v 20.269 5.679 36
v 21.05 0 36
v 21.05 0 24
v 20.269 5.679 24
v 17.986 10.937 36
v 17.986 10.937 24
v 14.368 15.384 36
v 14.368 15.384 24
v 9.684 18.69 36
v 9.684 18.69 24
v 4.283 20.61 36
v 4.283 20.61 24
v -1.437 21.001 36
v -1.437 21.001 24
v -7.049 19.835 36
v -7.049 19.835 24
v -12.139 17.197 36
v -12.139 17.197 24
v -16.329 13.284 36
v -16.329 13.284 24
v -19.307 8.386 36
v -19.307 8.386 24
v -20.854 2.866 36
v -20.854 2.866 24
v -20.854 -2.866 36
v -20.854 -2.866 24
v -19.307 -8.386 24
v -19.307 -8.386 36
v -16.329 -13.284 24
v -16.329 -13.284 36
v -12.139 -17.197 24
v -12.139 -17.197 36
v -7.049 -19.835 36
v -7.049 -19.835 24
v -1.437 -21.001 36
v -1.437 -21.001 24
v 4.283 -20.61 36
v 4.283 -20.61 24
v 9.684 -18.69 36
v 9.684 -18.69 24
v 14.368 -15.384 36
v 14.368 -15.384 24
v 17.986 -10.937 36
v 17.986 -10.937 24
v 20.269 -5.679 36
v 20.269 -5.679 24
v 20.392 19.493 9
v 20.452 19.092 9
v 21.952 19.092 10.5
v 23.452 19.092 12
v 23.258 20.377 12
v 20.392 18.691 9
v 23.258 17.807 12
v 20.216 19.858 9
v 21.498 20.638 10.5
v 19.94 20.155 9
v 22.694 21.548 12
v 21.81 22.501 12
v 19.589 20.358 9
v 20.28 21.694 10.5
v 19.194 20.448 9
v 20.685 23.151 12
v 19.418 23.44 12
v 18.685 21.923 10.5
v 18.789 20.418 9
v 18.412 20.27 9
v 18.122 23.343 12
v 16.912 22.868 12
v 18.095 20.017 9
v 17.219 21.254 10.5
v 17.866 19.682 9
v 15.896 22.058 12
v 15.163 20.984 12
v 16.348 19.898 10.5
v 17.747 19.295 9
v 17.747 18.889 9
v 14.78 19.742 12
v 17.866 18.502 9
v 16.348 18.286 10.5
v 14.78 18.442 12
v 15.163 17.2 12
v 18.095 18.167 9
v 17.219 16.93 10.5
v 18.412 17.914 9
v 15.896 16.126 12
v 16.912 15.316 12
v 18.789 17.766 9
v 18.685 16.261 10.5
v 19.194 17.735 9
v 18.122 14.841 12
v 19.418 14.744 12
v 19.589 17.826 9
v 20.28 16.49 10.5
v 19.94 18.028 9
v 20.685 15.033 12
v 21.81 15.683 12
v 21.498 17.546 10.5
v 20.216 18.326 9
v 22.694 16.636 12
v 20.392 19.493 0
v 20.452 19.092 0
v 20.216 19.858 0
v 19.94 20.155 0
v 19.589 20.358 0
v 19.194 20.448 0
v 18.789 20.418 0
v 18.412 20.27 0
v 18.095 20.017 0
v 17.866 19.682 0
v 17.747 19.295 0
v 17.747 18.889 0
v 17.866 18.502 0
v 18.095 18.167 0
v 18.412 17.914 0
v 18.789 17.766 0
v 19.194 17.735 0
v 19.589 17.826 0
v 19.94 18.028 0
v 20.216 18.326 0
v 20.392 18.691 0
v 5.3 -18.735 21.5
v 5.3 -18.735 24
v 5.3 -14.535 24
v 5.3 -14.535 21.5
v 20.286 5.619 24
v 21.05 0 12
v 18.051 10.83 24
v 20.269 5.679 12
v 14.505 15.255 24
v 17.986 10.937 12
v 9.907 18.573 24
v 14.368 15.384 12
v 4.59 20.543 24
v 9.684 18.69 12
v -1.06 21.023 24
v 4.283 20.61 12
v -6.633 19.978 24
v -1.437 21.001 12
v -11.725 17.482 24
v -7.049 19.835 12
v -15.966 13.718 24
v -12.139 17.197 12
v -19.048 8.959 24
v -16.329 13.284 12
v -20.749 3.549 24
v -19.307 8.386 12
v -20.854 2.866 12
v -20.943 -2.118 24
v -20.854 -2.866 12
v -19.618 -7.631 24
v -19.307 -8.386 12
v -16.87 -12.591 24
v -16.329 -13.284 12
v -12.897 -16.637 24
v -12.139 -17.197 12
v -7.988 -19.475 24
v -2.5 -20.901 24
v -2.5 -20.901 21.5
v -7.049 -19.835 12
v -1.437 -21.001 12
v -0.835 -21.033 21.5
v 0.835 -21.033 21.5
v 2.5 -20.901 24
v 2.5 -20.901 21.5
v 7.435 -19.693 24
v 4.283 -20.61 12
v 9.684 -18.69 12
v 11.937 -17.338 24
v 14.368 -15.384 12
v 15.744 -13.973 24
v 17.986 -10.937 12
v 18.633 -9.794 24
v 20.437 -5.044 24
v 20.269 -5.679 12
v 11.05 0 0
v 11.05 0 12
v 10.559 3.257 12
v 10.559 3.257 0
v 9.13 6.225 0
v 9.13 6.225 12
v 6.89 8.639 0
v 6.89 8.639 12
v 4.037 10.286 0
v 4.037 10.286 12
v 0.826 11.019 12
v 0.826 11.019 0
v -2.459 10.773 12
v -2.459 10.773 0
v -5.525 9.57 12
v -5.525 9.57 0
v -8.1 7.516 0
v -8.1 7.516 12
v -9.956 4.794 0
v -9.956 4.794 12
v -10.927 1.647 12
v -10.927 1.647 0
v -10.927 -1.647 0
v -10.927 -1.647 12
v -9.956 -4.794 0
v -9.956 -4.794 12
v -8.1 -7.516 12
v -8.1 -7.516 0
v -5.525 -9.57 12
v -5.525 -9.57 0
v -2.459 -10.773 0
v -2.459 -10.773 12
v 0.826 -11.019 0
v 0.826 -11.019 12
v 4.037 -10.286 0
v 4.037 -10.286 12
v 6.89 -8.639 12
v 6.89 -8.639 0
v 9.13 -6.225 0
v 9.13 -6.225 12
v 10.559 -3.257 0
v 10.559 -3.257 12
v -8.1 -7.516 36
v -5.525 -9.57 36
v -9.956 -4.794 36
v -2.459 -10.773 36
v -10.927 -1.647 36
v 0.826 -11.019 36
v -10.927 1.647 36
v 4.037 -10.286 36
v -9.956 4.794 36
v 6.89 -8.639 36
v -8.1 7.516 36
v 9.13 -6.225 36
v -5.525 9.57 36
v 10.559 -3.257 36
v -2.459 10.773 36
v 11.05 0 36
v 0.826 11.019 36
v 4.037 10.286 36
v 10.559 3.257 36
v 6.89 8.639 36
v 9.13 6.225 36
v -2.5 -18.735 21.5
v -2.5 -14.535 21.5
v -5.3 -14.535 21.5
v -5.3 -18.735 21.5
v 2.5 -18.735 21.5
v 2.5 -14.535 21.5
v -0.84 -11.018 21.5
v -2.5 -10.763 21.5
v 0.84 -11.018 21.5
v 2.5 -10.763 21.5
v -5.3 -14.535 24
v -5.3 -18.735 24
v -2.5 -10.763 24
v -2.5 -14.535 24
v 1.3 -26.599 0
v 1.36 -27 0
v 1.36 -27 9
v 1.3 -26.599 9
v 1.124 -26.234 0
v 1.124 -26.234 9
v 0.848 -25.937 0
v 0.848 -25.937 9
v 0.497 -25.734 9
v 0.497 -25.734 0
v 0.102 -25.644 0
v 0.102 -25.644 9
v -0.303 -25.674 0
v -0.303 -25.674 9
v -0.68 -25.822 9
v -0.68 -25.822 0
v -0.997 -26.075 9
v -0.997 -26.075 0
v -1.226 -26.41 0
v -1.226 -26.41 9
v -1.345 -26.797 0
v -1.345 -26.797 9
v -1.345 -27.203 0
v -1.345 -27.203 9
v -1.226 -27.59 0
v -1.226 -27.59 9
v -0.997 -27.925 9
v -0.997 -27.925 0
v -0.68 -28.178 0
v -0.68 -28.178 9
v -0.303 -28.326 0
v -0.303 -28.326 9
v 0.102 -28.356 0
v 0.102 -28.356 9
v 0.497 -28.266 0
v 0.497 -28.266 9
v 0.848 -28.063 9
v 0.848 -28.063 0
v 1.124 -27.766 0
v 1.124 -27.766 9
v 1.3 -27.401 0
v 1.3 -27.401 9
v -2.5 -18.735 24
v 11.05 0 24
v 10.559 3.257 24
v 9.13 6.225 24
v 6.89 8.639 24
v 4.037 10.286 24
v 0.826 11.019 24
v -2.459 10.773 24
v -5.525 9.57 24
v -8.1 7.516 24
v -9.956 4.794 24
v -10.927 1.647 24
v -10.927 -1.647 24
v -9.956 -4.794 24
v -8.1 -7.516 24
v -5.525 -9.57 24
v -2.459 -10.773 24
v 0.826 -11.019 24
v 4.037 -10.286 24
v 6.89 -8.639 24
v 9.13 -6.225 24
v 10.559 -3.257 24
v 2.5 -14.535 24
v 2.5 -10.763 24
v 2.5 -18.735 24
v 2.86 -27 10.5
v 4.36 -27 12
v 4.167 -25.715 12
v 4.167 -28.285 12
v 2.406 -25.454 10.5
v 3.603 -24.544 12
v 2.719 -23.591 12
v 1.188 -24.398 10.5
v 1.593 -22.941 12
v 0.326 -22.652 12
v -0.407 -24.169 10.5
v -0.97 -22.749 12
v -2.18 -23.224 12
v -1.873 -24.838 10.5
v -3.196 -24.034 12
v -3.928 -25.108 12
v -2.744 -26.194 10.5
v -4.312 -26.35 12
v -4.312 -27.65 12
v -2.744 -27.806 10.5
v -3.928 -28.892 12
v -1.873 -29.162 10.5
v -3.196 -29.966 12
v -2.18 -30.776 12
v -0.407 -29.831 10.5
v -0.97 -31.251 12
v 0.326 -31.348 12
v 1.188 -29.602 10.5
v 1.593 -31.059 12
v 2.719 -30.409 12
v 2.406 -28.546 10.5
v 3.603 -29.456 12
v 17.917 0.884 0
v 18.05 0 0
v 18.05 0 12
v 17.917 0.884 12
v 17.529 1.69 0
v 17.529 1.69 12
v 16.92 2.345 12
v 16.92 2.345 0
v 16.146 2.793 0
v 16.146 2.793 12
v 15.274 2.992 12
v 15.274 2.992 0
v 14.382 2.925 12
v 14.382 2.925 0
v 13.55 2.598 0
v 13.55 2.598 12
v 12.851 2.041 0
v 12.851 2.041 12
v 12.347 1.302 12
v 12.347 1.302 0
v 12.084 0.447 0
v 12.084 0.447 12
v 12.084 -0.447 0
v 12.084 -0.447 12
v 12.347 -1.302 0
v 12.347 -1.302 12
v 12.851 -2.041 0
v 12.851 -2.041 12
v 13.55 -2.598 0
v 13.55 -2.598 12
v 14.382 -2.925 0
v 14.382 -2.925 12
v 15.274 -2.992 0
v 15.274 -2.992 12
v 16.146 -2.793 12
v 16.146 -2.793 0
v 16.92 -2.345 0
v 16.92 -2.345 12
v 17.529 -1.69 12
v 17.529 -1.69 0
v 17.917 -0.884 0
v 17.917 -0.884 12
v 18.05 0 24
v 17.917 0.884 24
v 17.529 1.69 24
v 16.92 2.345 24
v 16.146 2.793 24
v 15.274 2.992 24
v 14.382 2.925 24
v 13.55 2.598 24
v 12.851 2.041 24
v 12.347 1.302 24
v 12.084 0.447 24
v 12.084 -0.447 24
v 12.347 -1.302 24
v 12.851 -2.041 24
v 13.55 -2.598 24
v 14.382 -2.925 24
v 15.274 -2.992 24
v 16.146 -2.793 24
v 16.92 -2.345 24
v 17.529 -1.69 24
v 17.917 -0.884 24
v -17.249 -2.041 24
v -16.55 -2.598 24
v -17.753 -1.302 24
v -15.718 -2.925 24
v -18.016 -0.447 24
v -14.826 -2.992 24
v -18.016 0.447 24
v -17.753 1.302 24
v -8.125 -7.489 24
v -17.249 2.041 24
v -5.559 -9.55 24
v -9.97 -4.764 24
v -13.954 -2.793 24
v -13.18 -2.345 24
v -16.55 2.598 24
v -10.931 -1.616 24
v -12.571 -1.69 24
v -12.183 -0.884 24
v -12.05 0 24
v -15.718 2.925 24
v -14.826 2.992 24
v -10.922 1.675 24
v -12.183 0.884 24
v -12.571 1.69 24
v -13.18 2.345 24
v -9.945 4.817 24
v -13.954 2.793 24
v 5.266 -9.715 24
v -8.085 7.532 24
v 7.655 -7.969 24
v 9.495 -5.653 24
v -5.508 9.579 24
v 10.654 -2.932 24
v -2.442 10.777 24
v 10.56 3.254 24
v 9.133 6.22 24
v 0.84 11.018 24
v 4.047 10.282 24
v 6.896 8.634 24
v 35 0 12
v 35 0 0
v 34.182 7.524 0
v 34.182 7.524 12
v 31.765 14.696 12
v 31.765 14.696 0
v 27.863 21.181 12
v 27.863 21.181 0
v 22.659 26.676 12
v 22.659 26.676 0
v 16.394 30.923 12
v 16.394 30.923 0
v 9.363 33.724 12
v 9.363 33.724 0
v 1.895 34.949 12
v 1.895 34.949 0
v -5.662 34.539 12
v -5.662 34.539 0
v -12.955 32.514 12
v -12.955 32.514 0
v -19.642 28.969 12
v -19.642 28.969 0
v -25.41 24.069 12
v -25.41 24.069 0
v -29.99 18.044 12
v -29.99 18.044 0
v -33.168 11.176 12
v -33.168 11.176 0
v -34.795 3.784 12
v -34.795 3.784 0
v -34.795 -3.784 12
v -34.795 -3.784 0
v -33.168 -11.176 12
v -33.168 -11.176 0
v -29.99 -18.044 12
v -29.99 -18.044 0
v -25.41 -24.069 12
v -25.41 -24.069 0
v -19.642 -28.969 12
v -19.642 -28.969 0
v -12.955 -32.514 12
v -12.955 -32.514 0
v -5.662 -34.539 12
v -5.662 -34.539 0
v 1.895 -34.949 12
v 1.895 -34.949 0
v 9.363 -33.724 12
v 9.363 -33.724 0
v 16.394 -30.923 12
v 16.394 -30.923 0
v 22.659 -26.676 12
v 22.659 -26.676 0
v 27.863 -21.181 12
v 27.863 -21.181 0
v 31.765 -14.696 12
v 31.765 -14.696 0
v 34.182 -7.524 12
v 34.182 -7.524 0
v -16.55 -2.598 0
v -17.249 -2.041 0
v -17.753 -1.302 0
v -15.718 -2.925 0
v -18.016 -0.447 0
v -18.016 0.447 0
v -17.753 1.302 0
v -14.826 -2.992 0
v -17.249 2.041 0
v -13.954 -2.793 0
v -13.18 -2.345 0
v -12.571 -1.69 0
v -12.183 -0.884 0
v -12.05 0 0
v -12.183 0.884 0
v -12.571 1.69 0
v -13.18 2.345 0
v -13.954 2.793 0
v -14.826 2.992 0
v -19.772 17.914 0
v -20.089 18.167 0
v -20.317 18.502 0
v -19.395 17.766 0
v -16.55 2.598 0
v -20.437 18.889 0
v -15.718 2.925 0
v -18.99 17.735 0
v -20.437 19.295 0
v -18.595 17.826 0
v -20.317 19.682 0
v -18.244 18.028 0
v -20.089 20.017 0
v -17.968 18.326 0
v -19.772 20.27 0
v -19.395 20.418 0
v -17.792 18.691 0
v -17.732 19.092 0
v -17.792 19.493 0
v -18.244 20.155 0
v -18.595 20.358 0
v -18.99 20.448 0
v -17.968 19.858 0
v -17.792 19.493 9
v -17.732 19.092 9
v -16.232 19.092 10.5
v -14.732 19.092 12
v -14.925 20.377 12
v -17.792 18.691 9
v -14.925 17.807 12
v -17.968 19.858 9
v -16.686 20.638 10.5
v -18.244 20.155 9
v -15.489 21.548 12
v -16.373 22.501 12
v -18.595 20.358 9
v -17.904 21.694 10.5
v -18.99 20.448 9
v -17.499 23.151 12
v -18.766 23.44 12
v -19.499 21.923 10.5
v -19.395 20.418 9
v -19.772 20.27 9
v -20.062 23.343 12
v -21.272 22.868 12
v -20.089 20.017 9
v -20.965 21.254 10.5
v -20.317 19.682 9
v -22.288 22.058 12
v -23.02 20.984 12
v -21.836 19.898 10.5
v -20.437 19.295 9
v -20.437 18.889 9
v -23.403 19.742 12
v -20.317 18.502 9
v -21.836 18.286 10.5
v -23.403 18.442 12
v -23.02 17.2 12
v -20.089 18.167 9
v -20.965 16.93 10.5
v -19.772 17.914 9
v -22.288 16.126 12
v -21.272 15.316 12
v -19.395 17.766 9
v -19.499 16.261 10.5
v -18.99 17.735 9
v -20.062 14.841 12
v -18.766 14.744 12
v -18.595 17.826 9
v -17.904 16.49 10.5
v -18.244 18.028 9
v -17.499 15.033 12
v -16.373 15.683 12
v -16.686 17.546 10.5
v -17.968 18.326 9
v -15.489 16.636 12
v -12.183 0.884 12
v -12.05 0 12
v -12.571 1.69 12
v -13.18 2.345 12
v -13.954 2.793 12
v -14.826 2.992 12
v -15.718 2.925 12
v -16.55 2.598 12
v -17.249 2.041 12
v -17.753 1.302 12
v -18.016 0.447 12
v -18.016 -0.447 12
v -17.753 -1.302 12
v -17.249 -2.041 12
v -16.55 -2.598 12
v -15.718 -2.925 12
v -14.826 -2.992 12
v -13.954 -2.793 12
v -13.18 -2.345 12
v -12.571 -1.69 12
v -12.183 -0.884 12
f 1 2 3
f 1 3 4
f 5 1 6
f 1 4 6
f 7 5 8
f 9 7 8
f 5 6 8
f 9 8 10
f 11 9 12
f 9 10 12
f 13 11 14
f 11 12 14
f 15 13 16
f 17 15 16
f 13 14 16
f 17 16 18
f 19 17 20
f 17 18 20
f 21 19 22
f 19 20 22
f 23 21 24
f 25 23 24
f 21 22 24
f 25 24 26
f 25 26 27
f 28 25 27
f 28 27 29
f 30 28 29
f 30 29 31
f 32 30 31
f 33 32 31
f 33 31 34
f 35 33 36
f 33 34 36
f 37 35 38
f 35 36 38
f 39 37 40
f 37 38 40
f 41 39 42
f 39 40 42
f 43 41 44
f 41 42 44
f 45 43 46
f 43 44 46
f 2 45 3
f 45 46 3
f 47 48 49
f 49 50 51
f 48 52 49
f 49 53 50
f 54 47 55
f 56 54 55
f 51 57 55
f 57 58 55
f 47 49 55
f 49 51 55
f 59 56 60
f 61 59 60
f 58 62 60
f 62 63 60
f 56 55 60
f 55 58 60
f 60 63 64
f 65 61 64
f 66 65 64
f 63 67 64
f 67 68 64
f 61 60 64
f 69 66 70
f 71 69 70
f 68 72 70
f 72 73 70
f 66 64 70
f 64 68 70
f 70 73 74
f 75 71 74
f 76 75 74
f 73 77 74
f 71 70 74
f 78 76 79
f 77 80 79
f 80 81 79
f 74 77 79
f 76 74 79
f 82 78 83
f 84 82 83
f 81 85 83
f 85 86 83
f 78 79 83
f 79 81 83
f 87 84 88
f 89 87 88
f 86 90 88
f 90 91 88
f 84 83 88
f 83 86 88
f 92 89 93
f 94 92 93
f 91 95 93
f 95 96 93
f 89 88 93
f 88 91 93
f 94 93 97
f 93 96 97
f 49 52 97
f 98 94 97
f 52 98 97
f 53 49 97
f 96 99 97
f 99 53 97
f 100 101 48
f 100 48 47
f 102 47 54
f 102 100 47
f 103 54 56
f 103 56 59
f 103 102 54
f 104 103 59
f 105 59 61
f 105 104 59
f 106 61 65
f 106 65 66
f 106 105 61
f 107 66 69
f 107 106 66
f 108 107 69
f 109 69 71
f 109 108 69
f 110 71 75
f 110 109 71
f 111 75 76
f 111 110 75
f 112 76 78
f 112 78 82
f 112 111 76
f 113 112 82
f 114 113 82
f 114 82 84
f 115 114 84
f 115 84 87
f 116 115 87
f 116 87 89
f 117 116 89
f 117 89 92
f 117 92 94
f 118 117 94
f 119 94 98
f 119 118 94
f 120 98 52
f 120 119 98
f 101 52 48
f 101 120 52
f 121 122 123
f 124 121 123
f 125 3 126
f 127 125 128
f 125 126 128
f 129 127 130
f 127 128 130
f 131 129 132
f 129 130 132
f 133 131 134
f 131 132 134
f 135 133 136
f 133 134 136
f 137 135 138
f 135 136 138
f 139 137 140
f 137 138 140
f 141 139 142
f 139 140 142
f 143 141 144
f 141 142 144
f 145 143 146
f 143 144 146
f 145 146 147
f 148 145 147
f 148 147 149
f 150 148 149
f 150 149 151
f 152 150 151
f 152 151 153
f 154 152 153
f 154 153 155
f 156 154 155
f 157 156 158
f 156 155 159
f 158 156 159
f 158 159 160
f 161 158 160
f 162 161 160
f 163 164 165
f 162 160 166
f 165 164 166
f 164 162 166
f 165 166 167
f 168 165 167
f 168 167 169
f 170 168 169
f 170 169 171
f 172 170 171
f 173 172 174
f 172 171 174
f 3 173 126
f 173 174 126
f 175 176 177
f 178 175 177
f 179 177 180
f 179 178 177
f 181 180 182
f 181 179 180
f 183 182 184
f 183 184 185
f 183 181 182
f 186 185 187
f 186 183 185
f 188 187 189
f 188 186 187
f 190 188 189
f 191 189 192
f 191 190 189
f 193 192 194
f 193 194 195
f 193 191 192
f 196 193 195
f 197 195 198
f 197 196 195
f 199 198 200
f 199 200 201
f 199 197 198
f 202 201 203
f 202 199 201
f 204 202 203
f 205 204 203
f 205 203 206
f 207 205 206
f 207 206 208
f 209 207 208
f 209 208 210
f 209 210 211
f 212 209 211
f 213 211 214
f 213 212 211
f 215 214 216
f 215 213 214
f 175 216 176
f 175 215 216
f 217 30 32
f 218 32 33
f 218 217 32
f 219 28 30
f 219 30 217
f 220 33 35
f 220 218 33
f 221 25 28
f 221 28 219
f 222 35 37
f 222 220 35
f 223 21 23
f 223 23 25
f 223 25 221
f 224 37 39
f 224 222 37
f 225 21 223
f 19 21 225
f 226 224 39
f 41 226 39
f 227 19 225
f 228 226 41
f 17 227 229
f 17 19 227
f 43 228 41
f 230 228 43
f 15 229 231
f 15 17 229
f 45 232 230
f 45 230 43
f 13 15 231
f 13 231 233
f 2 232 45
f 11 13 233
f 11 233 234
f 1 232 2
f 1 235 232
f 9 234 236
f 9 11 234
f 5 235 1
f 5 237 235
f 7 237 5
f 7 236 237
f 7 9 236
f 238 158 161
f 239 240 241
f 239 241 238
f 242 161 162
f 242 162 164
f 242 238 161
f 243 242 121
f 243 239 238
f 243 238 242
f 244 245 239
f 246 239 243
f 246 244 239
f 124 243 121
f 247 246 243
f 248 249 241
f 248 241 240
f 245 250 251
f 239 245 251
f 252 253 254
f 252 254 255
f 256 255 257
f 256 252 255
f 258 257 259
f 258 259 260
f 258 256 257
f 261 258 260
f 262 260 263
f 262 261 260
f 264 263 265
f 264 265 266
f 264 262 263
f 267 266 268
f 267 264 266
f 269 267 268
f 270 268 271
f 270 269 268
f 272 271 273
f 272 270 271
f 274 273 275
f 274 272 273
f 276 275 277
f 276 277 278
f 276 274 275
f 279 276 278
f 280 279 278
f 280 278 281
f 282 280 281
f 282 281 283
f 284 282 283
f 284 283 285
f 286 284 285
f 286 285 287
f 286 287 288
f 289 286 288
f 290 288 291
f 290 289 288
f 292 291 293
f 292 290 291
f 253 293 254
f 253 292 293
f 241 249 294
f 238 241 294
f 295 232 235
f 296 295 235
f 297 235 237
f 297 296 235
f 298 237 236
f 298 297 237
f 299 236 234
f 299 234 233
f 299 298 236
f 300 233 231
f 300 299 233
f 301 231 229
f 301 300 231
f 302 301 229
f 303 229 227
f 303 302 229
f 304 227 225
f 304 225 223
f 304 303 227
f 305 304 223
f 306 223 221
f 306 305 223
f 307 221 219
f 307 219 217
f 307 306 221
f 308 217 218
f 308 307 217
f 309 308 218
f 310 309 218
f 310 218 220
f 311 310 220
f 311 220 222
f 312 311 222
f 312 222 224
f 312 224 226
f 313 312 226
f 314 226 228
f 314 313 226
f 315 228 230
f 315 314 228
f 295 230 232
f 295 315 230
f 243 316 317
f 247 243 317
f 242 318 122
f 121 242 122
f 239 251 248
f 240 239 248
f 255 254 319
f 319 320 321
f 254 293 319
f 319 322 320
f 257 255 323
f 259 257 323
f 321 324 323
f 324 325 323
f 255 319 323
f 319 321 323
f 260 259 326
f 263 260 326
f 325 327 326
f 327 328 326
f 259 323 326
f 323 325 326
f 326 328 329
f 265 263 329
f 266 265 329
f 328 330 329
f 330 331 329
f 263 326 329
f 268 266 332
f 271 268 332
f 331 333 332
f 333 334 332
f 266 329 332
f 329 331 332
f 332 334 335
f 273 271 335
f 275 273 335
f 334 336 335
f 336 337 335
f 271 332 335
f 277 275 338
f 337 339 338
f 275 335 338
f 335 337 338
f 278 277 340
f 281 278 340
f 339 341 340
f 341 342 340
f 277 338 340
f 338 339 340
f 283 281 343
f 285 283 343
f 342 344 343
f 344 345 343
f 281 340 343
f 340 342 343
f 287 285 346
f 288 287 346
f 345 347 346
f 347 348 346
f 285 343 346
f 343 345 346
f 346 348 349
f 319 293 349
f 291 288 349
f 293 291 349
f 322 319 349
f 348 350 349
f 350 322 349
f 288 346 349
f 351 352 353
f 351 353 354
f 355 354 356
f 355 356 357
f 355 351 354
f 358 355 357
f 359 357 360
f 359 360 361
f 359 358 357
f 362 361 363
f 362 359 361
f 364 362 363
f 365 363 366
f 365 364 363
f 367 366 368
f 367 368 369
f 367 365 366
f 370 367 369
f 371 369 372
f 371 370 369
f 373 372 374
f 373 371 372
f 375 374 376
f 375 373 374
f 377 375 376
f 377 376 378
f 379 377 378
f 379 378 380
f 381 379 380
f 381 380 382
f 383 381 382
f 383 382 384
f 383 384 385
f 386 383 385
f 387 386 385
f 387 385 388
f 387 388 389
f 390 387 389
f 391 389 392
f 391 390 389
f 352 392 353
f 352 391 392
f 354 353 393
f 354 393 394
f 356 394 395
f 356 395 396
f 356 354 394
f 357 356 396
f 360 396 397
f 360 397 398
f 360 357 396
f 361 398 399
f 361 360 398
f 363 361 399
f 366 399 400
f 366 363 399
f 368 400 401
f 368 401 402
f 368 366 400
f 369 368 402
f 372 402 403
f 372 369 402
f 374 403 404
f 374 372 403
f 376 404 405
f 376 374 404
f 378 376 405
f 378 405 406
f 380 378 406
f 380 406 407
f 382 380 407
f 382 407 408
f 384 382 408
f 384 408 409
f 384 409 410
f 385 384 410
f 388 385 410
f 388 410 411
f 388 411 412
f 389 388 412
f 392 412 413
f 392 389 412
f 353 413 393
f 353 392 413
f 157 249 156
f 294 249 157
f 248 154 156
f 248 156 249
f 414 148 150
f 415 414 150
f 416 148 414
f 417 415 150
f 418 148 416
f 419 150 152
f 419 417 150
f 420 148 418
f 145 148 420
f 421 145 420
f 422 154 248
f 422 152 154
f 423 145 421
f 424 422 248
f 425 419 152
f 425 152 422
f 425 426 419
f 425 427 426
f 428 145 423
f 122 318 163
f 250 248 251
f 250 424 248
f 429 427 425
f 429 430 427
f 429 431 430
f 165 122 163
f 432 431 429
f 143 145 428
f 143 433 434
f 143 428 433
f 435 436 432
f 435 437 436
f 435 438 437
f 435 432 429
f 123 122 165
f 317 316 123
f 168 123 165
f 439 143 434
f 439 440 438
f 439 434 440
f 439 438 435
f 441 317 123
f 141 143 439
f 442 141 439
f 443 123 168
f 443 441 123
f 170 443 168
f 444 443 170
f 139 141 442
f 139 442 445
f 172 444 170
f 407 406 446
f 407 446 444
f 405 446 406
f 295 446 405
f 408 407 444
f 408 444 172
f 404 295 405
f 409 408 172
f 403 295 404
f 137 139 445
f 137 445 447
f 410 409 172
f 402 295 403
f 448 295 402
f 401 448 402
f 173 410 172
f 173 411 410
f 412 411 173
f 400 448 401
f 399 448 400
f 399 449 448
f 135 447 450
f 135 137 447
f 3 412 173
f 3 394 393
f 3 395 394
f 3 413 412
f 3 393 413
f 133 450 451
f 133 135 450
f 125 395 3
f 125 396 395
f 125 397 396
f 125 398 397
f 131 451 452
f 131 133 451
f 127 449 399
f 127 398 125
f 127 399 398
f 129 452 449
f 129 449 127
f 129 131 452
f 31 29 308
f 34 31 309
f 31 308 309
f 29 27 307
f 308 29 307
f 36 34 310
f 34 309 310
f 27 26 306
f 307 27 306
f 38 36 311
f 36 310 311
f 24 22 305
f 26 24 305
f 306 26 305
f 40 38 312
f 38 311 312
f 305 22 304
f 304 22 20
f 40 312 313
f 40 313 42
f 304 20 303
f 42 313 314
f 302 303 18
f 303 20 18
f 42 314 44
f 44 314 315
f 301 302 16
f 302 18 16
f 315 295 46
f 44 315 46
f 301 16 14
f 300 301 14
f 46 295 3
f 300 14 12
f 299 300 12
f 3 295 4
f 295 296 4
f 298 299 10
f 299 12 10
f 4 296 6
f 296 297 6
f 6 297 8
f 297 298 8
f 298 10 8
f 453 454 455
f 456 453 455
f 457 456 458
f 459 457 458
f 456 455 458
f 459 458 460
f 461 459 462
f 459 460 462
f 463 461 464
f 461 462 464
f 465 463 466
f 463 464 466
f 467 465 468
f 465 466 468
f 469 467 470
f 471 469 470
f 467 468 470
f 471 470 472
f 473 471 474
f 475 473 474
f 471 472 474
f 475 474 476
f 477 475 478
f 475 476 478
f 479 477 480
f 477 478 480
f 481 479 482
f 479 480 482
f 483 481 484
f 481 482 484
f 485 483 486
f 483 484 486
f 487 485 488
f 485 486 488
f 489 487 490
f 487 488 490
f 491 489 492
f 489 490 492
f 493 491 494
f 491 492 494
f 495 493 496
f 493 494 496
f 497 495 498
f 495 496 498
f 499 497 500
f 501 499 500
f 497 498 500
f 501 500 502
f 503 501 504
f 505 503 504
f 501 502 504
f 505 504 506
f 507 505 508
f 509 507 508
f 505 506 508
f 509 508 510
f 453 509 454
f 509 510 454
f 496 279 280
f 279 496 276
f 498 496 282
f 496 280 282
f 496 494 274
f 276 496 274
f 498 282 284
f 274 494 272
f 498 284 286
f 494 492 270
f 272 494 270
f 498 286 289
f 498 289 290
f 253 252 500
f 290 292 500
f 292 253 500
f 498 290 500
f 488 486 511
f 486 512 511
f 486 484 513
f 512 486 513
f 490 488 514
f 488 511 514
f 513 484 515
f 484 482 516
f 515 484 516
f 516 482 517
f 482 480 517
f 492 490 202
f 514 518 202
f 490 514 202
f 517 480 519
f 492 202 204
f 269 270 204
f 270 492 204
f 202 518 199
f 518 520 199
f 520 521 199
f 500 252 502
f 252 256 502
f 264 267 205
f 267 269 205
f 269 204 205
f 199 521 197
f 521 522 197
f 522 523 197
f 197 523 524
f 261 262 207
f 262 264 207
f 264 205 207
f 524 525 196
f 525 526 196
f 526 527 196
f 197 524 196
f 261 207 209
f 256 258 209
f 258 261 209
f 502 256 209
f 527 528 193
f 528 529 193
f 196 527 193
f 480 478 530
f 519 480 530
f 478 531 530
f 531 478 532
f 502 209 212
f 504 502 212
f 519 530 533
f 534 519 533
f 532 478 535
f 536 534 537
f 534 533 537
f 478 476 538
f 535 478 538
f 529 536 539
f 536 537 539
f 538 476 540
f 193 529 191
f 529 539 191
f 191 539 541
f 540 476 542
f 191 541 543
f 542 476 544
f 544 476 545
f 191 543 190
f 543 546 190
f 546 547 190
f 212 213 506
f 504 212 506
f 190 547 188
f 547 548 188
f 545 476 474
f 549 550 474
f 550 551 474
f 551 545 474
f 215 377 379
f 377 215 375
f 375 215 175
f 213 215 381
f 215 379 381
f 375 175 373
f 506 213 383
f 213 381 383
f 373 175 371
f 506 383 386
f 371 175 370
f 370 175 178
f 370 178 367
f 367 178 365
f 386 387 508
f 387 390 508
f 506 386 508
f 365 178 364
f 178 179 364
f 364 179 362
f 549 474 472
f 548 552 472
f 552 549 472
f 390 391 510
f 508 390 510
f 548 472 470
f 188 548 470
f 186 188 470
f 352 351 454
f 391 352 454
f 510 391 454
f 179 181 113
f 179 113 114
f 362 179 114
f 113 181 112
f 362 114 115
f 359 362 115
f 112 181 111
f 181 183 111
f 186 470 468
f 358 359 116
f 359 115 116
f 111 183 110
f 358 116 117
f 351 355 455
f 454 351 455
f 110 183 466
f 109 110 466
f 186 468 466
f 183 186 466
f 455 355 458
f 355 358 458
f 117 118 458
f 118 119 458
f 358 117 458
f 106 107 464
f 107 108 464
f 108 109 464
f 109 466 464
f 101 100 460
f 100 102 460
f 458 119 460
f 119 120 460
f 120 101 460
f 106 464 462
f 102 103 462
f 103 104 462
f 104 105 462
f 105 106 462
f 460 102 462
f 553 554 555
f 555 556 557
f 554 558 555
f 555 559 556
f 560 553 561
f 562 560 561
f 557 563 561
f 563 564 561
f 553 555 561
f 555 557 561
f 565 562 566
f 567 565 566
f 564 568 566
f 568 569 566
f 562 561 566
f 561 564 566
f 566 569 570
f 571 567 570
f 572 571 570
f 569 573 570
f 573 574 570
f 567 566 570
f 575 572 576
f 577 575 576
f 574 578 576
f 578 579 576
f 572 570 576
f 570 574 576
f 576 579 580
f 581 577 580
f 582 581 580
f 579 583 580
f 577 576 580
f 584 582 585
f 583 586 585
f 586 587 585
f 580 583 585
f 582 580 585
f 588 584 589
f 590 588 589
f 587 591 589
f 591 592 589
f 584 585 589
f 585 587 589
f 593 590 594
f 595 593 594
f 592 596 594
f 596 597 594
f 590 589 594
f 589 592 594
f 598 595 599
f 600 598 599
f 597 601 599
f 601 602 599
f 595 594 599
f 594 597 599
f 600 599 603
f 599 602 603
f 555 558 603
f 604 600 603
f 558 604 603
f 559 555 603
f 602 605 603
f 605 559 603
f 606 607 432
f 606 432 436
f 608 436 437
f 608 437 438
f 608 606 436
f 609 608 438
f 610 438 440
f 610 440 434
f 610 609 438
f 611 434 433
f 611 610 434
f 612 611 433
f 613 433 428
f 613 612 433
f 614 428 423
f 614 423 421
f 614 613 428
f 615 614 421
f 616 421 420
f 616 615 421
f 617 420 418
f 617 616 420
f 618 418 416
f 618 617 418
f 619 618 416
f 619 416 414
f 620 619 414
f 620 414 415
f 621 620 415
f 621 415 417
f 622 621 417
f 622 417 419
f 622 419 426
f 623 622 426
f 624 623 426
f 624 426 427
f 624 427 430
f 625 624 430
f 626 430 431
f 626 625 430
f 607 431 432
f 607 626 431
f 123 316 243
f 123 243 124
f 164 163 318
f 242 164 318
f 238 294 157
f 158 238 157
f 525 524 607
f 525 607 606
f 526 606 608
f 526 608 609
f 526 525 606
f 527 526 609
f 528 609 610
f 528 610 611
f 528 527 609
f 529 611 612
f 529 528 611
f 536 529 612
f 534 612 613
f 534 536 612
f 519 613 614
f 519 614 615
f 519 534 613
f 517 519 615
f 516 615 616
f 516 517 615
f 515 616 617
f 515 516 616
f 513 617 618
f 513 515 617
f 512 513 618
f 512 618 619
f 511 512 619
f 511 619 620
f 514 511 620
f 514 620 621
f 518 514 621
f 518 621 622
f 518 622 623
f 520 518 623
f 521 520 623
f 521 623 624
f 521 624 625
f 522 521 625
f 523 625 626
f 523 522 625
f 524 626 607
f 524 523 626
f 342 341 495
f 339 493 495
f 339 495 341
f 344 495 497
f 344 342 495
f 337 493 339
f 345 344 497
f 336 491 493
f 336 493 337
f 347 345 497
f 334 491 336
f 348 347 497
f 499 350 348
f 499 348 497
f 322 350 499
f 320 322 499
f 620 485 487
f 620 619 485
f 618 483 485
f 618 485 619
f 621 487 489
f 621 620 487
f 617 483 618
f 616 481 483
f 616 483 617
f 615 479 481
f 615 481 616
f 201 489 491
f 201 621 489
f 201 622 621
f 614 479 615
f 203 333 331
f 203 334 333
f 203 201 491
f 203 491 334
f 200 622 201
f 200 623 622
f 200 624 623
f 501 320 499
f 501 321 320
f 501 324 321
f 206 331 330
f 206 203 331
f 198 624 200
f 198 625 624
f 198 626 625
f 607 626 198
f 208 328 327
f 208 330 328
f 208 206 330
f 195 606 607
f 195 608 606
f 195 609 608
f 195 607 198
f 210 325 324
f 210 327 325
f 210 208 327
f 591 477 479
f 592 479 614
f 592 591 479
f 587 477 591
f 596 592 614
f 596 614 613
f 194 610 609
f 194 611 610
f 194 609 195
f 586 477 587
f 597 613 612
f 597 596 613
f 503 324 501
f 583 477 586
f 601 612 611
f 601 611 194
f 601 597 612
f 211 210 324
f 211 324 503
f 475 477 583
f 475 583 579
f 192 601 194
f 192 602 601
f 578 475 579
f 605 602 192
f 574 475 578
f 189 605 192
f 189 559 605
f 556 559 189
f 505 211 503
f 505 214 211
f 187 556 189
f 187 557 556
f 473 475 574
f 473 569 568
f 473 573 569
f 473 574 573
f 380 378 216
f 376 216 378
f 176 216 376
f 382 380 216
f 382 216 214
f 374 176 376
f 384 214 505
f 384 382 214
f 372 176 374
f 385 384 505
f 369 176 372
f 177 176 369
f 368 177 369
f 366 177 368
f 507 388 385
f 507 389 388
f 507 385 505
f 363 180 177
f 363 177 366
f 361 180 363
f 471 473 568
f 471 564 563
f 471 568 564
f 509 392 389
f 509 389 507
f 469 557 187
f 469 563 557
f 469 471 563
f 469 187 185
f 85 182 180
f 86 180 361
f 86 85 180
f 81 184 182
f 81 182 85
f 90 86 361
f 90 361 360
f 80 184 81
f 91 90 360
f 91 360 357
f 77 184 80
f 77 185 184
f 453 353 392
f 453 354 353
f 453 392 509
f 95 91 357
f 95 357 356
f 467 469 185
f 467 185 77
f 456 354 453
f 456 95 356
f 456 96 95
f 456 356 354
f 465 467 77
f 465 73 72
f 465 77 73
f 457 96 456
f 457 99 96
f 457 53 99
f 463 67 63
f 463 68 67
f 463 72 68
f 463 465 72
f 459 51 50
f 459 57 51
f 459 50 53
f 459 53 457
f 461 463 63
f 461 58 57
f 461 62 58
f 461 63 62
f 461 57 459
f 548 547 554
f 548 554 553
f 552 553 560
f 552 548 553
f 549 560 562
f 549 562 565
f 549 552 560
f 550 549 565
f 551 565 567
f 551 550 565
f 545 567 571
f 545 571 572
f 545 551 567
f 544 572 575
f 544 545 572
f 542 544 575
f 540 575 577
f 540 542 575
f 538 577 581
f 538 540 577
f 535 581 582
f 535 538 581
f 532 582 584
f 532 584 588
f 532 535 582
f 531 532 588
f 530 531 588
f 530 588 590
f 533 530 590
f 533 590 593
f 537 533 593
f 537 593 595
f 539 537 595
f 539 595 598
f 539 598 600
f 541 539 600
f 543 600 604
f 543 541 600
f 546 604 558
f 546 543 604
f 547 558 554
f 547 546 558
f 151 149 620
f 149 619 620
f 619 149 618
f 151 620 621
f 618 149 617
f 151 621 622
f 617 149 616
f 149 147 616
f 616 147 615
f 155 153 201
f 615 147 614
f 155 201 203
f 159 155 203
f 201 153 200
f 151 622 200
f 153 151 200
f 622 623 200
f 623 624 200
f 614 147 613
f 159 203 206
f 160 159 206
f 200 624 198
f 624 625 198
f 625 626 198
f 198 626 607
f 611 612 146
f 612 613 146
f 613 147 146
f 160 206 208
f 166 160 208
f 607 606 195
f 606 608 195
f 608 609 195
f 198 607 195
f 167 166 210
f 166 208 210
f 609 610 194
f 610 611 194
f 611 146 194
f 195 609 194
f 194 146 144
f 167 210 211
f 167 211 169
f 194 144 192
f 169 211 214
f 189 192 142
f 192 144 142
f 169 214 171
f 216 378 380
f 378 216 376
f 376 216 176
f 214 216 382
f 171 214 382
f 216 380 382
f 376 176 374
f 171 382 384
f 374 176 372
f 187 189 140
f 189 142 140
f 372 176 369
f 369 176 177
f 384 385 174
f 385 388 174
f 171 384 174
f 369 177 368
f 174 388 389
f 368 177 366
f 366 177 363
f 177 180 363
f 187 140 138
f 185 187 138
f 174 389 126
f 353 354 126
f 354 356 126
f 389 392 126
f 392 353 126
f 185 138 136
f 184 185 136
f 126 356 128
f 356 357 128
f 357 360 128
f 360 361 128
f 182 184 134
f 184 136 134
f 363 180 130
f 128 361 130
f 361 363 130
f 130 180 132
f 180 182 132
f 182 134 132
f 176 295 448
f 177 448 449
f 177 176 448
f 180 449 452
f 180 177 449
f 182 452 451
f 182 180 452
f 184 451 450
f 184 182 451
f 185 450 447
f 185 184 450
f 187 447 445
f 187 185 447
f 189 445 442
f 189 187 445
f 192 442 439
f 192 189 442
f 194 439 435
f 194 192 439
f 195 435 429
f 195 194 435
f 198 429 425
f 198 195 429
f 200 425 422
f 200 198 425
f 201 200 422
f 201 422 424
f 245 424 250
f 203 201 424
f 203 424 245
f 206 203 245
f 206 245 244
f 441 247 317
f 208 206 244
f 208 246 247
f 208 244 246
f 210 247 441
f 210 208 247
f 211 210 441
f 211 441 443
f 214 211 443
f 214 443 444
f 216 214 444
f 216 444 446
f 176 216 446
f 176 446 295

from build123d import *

# Parameters (mm, degrees)
F0_R     = 35
F0_R_2   = 1.3602375339
F0_R_3   = 3
F0_R_4   = 11.05
F1_DEPTH = 12
F2_R     = 21.05
F2_R_2   = 3
F2_R_3   = 11.05
F3_DEPTH = 12
F4_W     = 5
F4_H     = 4.2
F4_W_2   = 2.8
F5_DEPTH = 2.5
F6_R     = 21.05
F6_R_2   = 11.05
F7_DEPTH = 12
F8_SIZE  = 3


with BuildPart() as f1:
    # F0 (on Top) → F1 (new body)
    with BuildSketch(Plane.XY):
        Circle(F0_R)
        with Locations((0, -27)):
            Circle(F0_R_2, mode=Mode.SUBTRACT)
        with Locations((-15.05, 0)):
            Circle(F0_R_3, mode=Mode.SUBTRACT)
        with Locations((-19.091883092, 19.091883092)):
            Circle(F0_R_2, mode=Mode.SUBTRACT)
        Circle(F0_R_4, mode=Mode.SUBTRACT)
        with Locations((15.05, 0)):
            Circle(F0_R_3, mode=Mode.SUBTRACT)
        with Locations((19.091883092, 19.091883092)):
            Circle(F0_R_2, mode=Mode.SUBTRACT)
    extrude(amount=F1_DEPTH)

    # F8
    f8_edges = [f1.edges().sort_by_distance(p)[0] for p in [
        (-20.452121, 19.091883, 12),
        (-1.360238, -27, 12),
        (17.731646, 19.091883, 12),
    ]]
    chamfer(f8_edges, length=F8_SIZE)


with BuildPart() as f3:
    # F2 (on face) → F3 (new body)
    with BuildSketch(Plane.XY.offset(12)):
        Circle(F2_R)
        with Locations((-15.05, 0)):
            Circle(F2_R_2, mode=Mode.SUBTRACT)
        Circle(F2_R_3, mode=Mode.SUBTRACT)
        with Locations((15.05, 0)):
            Circle(F2_R_2, mode=Mode.SUBTRACT)
    extrude(amount=F3_DEPTH)

    # F4 (on face) → F5 (cut)
    with BuildSketch(Plane.XY.offset(24)):
        with Locations((0, -16.6352150679)):
            Rectangle(F4_W, F4_H)
        with Locations((-3.9, -16.6352150679)):
            Rectangle(F4_W_2, F4_H)
        with BuildLine():
            ThreePointArc((2.5, -10.7634799205), (0, -11.05), (-2.5, -10.7634799205))
            Line((-2.5, -10.7634799205), (-2.5, -14.5352150679))
            Line((-2.5, -14.5352150679), (2.5, -14.5352150679))
            Line((2.5, -14.5352150679), (2.5, -10.7634799205))
        make_face()
        with Locations((3.9, -16.6352150679)):
            Rectangle(F4_W_2, F4_H)
        with BuildLine():
            Line((2.5, -18.7352150679), (-2.5, -18.7352150679))
            Line((-2.5, -18.7352150679), (-2.5, -20.9010167217))
            ThreePointArc((-2.5, -20.9010167217), (0, -21.05), (2.5, -20.9010167217))
            Line((2.5, -20.9010167217), (2.5, -18.7352150679))
        make_face()
    extrude(amount=-F5_DEPTH, mode=Mode.SUBTRACT)


with BuildPart() as f7:
    # F6 (on face) → F7 (new body)
    with BuildSketch(Plane.XY.offset(24)):
        Circle(F6_R)
        Circle(F6_R_2, mode=Mode.SUBTRACT)
    extrude(amount=F7_DEPTH)


solid = Compound([f1.part, f3.part, f7.part])
